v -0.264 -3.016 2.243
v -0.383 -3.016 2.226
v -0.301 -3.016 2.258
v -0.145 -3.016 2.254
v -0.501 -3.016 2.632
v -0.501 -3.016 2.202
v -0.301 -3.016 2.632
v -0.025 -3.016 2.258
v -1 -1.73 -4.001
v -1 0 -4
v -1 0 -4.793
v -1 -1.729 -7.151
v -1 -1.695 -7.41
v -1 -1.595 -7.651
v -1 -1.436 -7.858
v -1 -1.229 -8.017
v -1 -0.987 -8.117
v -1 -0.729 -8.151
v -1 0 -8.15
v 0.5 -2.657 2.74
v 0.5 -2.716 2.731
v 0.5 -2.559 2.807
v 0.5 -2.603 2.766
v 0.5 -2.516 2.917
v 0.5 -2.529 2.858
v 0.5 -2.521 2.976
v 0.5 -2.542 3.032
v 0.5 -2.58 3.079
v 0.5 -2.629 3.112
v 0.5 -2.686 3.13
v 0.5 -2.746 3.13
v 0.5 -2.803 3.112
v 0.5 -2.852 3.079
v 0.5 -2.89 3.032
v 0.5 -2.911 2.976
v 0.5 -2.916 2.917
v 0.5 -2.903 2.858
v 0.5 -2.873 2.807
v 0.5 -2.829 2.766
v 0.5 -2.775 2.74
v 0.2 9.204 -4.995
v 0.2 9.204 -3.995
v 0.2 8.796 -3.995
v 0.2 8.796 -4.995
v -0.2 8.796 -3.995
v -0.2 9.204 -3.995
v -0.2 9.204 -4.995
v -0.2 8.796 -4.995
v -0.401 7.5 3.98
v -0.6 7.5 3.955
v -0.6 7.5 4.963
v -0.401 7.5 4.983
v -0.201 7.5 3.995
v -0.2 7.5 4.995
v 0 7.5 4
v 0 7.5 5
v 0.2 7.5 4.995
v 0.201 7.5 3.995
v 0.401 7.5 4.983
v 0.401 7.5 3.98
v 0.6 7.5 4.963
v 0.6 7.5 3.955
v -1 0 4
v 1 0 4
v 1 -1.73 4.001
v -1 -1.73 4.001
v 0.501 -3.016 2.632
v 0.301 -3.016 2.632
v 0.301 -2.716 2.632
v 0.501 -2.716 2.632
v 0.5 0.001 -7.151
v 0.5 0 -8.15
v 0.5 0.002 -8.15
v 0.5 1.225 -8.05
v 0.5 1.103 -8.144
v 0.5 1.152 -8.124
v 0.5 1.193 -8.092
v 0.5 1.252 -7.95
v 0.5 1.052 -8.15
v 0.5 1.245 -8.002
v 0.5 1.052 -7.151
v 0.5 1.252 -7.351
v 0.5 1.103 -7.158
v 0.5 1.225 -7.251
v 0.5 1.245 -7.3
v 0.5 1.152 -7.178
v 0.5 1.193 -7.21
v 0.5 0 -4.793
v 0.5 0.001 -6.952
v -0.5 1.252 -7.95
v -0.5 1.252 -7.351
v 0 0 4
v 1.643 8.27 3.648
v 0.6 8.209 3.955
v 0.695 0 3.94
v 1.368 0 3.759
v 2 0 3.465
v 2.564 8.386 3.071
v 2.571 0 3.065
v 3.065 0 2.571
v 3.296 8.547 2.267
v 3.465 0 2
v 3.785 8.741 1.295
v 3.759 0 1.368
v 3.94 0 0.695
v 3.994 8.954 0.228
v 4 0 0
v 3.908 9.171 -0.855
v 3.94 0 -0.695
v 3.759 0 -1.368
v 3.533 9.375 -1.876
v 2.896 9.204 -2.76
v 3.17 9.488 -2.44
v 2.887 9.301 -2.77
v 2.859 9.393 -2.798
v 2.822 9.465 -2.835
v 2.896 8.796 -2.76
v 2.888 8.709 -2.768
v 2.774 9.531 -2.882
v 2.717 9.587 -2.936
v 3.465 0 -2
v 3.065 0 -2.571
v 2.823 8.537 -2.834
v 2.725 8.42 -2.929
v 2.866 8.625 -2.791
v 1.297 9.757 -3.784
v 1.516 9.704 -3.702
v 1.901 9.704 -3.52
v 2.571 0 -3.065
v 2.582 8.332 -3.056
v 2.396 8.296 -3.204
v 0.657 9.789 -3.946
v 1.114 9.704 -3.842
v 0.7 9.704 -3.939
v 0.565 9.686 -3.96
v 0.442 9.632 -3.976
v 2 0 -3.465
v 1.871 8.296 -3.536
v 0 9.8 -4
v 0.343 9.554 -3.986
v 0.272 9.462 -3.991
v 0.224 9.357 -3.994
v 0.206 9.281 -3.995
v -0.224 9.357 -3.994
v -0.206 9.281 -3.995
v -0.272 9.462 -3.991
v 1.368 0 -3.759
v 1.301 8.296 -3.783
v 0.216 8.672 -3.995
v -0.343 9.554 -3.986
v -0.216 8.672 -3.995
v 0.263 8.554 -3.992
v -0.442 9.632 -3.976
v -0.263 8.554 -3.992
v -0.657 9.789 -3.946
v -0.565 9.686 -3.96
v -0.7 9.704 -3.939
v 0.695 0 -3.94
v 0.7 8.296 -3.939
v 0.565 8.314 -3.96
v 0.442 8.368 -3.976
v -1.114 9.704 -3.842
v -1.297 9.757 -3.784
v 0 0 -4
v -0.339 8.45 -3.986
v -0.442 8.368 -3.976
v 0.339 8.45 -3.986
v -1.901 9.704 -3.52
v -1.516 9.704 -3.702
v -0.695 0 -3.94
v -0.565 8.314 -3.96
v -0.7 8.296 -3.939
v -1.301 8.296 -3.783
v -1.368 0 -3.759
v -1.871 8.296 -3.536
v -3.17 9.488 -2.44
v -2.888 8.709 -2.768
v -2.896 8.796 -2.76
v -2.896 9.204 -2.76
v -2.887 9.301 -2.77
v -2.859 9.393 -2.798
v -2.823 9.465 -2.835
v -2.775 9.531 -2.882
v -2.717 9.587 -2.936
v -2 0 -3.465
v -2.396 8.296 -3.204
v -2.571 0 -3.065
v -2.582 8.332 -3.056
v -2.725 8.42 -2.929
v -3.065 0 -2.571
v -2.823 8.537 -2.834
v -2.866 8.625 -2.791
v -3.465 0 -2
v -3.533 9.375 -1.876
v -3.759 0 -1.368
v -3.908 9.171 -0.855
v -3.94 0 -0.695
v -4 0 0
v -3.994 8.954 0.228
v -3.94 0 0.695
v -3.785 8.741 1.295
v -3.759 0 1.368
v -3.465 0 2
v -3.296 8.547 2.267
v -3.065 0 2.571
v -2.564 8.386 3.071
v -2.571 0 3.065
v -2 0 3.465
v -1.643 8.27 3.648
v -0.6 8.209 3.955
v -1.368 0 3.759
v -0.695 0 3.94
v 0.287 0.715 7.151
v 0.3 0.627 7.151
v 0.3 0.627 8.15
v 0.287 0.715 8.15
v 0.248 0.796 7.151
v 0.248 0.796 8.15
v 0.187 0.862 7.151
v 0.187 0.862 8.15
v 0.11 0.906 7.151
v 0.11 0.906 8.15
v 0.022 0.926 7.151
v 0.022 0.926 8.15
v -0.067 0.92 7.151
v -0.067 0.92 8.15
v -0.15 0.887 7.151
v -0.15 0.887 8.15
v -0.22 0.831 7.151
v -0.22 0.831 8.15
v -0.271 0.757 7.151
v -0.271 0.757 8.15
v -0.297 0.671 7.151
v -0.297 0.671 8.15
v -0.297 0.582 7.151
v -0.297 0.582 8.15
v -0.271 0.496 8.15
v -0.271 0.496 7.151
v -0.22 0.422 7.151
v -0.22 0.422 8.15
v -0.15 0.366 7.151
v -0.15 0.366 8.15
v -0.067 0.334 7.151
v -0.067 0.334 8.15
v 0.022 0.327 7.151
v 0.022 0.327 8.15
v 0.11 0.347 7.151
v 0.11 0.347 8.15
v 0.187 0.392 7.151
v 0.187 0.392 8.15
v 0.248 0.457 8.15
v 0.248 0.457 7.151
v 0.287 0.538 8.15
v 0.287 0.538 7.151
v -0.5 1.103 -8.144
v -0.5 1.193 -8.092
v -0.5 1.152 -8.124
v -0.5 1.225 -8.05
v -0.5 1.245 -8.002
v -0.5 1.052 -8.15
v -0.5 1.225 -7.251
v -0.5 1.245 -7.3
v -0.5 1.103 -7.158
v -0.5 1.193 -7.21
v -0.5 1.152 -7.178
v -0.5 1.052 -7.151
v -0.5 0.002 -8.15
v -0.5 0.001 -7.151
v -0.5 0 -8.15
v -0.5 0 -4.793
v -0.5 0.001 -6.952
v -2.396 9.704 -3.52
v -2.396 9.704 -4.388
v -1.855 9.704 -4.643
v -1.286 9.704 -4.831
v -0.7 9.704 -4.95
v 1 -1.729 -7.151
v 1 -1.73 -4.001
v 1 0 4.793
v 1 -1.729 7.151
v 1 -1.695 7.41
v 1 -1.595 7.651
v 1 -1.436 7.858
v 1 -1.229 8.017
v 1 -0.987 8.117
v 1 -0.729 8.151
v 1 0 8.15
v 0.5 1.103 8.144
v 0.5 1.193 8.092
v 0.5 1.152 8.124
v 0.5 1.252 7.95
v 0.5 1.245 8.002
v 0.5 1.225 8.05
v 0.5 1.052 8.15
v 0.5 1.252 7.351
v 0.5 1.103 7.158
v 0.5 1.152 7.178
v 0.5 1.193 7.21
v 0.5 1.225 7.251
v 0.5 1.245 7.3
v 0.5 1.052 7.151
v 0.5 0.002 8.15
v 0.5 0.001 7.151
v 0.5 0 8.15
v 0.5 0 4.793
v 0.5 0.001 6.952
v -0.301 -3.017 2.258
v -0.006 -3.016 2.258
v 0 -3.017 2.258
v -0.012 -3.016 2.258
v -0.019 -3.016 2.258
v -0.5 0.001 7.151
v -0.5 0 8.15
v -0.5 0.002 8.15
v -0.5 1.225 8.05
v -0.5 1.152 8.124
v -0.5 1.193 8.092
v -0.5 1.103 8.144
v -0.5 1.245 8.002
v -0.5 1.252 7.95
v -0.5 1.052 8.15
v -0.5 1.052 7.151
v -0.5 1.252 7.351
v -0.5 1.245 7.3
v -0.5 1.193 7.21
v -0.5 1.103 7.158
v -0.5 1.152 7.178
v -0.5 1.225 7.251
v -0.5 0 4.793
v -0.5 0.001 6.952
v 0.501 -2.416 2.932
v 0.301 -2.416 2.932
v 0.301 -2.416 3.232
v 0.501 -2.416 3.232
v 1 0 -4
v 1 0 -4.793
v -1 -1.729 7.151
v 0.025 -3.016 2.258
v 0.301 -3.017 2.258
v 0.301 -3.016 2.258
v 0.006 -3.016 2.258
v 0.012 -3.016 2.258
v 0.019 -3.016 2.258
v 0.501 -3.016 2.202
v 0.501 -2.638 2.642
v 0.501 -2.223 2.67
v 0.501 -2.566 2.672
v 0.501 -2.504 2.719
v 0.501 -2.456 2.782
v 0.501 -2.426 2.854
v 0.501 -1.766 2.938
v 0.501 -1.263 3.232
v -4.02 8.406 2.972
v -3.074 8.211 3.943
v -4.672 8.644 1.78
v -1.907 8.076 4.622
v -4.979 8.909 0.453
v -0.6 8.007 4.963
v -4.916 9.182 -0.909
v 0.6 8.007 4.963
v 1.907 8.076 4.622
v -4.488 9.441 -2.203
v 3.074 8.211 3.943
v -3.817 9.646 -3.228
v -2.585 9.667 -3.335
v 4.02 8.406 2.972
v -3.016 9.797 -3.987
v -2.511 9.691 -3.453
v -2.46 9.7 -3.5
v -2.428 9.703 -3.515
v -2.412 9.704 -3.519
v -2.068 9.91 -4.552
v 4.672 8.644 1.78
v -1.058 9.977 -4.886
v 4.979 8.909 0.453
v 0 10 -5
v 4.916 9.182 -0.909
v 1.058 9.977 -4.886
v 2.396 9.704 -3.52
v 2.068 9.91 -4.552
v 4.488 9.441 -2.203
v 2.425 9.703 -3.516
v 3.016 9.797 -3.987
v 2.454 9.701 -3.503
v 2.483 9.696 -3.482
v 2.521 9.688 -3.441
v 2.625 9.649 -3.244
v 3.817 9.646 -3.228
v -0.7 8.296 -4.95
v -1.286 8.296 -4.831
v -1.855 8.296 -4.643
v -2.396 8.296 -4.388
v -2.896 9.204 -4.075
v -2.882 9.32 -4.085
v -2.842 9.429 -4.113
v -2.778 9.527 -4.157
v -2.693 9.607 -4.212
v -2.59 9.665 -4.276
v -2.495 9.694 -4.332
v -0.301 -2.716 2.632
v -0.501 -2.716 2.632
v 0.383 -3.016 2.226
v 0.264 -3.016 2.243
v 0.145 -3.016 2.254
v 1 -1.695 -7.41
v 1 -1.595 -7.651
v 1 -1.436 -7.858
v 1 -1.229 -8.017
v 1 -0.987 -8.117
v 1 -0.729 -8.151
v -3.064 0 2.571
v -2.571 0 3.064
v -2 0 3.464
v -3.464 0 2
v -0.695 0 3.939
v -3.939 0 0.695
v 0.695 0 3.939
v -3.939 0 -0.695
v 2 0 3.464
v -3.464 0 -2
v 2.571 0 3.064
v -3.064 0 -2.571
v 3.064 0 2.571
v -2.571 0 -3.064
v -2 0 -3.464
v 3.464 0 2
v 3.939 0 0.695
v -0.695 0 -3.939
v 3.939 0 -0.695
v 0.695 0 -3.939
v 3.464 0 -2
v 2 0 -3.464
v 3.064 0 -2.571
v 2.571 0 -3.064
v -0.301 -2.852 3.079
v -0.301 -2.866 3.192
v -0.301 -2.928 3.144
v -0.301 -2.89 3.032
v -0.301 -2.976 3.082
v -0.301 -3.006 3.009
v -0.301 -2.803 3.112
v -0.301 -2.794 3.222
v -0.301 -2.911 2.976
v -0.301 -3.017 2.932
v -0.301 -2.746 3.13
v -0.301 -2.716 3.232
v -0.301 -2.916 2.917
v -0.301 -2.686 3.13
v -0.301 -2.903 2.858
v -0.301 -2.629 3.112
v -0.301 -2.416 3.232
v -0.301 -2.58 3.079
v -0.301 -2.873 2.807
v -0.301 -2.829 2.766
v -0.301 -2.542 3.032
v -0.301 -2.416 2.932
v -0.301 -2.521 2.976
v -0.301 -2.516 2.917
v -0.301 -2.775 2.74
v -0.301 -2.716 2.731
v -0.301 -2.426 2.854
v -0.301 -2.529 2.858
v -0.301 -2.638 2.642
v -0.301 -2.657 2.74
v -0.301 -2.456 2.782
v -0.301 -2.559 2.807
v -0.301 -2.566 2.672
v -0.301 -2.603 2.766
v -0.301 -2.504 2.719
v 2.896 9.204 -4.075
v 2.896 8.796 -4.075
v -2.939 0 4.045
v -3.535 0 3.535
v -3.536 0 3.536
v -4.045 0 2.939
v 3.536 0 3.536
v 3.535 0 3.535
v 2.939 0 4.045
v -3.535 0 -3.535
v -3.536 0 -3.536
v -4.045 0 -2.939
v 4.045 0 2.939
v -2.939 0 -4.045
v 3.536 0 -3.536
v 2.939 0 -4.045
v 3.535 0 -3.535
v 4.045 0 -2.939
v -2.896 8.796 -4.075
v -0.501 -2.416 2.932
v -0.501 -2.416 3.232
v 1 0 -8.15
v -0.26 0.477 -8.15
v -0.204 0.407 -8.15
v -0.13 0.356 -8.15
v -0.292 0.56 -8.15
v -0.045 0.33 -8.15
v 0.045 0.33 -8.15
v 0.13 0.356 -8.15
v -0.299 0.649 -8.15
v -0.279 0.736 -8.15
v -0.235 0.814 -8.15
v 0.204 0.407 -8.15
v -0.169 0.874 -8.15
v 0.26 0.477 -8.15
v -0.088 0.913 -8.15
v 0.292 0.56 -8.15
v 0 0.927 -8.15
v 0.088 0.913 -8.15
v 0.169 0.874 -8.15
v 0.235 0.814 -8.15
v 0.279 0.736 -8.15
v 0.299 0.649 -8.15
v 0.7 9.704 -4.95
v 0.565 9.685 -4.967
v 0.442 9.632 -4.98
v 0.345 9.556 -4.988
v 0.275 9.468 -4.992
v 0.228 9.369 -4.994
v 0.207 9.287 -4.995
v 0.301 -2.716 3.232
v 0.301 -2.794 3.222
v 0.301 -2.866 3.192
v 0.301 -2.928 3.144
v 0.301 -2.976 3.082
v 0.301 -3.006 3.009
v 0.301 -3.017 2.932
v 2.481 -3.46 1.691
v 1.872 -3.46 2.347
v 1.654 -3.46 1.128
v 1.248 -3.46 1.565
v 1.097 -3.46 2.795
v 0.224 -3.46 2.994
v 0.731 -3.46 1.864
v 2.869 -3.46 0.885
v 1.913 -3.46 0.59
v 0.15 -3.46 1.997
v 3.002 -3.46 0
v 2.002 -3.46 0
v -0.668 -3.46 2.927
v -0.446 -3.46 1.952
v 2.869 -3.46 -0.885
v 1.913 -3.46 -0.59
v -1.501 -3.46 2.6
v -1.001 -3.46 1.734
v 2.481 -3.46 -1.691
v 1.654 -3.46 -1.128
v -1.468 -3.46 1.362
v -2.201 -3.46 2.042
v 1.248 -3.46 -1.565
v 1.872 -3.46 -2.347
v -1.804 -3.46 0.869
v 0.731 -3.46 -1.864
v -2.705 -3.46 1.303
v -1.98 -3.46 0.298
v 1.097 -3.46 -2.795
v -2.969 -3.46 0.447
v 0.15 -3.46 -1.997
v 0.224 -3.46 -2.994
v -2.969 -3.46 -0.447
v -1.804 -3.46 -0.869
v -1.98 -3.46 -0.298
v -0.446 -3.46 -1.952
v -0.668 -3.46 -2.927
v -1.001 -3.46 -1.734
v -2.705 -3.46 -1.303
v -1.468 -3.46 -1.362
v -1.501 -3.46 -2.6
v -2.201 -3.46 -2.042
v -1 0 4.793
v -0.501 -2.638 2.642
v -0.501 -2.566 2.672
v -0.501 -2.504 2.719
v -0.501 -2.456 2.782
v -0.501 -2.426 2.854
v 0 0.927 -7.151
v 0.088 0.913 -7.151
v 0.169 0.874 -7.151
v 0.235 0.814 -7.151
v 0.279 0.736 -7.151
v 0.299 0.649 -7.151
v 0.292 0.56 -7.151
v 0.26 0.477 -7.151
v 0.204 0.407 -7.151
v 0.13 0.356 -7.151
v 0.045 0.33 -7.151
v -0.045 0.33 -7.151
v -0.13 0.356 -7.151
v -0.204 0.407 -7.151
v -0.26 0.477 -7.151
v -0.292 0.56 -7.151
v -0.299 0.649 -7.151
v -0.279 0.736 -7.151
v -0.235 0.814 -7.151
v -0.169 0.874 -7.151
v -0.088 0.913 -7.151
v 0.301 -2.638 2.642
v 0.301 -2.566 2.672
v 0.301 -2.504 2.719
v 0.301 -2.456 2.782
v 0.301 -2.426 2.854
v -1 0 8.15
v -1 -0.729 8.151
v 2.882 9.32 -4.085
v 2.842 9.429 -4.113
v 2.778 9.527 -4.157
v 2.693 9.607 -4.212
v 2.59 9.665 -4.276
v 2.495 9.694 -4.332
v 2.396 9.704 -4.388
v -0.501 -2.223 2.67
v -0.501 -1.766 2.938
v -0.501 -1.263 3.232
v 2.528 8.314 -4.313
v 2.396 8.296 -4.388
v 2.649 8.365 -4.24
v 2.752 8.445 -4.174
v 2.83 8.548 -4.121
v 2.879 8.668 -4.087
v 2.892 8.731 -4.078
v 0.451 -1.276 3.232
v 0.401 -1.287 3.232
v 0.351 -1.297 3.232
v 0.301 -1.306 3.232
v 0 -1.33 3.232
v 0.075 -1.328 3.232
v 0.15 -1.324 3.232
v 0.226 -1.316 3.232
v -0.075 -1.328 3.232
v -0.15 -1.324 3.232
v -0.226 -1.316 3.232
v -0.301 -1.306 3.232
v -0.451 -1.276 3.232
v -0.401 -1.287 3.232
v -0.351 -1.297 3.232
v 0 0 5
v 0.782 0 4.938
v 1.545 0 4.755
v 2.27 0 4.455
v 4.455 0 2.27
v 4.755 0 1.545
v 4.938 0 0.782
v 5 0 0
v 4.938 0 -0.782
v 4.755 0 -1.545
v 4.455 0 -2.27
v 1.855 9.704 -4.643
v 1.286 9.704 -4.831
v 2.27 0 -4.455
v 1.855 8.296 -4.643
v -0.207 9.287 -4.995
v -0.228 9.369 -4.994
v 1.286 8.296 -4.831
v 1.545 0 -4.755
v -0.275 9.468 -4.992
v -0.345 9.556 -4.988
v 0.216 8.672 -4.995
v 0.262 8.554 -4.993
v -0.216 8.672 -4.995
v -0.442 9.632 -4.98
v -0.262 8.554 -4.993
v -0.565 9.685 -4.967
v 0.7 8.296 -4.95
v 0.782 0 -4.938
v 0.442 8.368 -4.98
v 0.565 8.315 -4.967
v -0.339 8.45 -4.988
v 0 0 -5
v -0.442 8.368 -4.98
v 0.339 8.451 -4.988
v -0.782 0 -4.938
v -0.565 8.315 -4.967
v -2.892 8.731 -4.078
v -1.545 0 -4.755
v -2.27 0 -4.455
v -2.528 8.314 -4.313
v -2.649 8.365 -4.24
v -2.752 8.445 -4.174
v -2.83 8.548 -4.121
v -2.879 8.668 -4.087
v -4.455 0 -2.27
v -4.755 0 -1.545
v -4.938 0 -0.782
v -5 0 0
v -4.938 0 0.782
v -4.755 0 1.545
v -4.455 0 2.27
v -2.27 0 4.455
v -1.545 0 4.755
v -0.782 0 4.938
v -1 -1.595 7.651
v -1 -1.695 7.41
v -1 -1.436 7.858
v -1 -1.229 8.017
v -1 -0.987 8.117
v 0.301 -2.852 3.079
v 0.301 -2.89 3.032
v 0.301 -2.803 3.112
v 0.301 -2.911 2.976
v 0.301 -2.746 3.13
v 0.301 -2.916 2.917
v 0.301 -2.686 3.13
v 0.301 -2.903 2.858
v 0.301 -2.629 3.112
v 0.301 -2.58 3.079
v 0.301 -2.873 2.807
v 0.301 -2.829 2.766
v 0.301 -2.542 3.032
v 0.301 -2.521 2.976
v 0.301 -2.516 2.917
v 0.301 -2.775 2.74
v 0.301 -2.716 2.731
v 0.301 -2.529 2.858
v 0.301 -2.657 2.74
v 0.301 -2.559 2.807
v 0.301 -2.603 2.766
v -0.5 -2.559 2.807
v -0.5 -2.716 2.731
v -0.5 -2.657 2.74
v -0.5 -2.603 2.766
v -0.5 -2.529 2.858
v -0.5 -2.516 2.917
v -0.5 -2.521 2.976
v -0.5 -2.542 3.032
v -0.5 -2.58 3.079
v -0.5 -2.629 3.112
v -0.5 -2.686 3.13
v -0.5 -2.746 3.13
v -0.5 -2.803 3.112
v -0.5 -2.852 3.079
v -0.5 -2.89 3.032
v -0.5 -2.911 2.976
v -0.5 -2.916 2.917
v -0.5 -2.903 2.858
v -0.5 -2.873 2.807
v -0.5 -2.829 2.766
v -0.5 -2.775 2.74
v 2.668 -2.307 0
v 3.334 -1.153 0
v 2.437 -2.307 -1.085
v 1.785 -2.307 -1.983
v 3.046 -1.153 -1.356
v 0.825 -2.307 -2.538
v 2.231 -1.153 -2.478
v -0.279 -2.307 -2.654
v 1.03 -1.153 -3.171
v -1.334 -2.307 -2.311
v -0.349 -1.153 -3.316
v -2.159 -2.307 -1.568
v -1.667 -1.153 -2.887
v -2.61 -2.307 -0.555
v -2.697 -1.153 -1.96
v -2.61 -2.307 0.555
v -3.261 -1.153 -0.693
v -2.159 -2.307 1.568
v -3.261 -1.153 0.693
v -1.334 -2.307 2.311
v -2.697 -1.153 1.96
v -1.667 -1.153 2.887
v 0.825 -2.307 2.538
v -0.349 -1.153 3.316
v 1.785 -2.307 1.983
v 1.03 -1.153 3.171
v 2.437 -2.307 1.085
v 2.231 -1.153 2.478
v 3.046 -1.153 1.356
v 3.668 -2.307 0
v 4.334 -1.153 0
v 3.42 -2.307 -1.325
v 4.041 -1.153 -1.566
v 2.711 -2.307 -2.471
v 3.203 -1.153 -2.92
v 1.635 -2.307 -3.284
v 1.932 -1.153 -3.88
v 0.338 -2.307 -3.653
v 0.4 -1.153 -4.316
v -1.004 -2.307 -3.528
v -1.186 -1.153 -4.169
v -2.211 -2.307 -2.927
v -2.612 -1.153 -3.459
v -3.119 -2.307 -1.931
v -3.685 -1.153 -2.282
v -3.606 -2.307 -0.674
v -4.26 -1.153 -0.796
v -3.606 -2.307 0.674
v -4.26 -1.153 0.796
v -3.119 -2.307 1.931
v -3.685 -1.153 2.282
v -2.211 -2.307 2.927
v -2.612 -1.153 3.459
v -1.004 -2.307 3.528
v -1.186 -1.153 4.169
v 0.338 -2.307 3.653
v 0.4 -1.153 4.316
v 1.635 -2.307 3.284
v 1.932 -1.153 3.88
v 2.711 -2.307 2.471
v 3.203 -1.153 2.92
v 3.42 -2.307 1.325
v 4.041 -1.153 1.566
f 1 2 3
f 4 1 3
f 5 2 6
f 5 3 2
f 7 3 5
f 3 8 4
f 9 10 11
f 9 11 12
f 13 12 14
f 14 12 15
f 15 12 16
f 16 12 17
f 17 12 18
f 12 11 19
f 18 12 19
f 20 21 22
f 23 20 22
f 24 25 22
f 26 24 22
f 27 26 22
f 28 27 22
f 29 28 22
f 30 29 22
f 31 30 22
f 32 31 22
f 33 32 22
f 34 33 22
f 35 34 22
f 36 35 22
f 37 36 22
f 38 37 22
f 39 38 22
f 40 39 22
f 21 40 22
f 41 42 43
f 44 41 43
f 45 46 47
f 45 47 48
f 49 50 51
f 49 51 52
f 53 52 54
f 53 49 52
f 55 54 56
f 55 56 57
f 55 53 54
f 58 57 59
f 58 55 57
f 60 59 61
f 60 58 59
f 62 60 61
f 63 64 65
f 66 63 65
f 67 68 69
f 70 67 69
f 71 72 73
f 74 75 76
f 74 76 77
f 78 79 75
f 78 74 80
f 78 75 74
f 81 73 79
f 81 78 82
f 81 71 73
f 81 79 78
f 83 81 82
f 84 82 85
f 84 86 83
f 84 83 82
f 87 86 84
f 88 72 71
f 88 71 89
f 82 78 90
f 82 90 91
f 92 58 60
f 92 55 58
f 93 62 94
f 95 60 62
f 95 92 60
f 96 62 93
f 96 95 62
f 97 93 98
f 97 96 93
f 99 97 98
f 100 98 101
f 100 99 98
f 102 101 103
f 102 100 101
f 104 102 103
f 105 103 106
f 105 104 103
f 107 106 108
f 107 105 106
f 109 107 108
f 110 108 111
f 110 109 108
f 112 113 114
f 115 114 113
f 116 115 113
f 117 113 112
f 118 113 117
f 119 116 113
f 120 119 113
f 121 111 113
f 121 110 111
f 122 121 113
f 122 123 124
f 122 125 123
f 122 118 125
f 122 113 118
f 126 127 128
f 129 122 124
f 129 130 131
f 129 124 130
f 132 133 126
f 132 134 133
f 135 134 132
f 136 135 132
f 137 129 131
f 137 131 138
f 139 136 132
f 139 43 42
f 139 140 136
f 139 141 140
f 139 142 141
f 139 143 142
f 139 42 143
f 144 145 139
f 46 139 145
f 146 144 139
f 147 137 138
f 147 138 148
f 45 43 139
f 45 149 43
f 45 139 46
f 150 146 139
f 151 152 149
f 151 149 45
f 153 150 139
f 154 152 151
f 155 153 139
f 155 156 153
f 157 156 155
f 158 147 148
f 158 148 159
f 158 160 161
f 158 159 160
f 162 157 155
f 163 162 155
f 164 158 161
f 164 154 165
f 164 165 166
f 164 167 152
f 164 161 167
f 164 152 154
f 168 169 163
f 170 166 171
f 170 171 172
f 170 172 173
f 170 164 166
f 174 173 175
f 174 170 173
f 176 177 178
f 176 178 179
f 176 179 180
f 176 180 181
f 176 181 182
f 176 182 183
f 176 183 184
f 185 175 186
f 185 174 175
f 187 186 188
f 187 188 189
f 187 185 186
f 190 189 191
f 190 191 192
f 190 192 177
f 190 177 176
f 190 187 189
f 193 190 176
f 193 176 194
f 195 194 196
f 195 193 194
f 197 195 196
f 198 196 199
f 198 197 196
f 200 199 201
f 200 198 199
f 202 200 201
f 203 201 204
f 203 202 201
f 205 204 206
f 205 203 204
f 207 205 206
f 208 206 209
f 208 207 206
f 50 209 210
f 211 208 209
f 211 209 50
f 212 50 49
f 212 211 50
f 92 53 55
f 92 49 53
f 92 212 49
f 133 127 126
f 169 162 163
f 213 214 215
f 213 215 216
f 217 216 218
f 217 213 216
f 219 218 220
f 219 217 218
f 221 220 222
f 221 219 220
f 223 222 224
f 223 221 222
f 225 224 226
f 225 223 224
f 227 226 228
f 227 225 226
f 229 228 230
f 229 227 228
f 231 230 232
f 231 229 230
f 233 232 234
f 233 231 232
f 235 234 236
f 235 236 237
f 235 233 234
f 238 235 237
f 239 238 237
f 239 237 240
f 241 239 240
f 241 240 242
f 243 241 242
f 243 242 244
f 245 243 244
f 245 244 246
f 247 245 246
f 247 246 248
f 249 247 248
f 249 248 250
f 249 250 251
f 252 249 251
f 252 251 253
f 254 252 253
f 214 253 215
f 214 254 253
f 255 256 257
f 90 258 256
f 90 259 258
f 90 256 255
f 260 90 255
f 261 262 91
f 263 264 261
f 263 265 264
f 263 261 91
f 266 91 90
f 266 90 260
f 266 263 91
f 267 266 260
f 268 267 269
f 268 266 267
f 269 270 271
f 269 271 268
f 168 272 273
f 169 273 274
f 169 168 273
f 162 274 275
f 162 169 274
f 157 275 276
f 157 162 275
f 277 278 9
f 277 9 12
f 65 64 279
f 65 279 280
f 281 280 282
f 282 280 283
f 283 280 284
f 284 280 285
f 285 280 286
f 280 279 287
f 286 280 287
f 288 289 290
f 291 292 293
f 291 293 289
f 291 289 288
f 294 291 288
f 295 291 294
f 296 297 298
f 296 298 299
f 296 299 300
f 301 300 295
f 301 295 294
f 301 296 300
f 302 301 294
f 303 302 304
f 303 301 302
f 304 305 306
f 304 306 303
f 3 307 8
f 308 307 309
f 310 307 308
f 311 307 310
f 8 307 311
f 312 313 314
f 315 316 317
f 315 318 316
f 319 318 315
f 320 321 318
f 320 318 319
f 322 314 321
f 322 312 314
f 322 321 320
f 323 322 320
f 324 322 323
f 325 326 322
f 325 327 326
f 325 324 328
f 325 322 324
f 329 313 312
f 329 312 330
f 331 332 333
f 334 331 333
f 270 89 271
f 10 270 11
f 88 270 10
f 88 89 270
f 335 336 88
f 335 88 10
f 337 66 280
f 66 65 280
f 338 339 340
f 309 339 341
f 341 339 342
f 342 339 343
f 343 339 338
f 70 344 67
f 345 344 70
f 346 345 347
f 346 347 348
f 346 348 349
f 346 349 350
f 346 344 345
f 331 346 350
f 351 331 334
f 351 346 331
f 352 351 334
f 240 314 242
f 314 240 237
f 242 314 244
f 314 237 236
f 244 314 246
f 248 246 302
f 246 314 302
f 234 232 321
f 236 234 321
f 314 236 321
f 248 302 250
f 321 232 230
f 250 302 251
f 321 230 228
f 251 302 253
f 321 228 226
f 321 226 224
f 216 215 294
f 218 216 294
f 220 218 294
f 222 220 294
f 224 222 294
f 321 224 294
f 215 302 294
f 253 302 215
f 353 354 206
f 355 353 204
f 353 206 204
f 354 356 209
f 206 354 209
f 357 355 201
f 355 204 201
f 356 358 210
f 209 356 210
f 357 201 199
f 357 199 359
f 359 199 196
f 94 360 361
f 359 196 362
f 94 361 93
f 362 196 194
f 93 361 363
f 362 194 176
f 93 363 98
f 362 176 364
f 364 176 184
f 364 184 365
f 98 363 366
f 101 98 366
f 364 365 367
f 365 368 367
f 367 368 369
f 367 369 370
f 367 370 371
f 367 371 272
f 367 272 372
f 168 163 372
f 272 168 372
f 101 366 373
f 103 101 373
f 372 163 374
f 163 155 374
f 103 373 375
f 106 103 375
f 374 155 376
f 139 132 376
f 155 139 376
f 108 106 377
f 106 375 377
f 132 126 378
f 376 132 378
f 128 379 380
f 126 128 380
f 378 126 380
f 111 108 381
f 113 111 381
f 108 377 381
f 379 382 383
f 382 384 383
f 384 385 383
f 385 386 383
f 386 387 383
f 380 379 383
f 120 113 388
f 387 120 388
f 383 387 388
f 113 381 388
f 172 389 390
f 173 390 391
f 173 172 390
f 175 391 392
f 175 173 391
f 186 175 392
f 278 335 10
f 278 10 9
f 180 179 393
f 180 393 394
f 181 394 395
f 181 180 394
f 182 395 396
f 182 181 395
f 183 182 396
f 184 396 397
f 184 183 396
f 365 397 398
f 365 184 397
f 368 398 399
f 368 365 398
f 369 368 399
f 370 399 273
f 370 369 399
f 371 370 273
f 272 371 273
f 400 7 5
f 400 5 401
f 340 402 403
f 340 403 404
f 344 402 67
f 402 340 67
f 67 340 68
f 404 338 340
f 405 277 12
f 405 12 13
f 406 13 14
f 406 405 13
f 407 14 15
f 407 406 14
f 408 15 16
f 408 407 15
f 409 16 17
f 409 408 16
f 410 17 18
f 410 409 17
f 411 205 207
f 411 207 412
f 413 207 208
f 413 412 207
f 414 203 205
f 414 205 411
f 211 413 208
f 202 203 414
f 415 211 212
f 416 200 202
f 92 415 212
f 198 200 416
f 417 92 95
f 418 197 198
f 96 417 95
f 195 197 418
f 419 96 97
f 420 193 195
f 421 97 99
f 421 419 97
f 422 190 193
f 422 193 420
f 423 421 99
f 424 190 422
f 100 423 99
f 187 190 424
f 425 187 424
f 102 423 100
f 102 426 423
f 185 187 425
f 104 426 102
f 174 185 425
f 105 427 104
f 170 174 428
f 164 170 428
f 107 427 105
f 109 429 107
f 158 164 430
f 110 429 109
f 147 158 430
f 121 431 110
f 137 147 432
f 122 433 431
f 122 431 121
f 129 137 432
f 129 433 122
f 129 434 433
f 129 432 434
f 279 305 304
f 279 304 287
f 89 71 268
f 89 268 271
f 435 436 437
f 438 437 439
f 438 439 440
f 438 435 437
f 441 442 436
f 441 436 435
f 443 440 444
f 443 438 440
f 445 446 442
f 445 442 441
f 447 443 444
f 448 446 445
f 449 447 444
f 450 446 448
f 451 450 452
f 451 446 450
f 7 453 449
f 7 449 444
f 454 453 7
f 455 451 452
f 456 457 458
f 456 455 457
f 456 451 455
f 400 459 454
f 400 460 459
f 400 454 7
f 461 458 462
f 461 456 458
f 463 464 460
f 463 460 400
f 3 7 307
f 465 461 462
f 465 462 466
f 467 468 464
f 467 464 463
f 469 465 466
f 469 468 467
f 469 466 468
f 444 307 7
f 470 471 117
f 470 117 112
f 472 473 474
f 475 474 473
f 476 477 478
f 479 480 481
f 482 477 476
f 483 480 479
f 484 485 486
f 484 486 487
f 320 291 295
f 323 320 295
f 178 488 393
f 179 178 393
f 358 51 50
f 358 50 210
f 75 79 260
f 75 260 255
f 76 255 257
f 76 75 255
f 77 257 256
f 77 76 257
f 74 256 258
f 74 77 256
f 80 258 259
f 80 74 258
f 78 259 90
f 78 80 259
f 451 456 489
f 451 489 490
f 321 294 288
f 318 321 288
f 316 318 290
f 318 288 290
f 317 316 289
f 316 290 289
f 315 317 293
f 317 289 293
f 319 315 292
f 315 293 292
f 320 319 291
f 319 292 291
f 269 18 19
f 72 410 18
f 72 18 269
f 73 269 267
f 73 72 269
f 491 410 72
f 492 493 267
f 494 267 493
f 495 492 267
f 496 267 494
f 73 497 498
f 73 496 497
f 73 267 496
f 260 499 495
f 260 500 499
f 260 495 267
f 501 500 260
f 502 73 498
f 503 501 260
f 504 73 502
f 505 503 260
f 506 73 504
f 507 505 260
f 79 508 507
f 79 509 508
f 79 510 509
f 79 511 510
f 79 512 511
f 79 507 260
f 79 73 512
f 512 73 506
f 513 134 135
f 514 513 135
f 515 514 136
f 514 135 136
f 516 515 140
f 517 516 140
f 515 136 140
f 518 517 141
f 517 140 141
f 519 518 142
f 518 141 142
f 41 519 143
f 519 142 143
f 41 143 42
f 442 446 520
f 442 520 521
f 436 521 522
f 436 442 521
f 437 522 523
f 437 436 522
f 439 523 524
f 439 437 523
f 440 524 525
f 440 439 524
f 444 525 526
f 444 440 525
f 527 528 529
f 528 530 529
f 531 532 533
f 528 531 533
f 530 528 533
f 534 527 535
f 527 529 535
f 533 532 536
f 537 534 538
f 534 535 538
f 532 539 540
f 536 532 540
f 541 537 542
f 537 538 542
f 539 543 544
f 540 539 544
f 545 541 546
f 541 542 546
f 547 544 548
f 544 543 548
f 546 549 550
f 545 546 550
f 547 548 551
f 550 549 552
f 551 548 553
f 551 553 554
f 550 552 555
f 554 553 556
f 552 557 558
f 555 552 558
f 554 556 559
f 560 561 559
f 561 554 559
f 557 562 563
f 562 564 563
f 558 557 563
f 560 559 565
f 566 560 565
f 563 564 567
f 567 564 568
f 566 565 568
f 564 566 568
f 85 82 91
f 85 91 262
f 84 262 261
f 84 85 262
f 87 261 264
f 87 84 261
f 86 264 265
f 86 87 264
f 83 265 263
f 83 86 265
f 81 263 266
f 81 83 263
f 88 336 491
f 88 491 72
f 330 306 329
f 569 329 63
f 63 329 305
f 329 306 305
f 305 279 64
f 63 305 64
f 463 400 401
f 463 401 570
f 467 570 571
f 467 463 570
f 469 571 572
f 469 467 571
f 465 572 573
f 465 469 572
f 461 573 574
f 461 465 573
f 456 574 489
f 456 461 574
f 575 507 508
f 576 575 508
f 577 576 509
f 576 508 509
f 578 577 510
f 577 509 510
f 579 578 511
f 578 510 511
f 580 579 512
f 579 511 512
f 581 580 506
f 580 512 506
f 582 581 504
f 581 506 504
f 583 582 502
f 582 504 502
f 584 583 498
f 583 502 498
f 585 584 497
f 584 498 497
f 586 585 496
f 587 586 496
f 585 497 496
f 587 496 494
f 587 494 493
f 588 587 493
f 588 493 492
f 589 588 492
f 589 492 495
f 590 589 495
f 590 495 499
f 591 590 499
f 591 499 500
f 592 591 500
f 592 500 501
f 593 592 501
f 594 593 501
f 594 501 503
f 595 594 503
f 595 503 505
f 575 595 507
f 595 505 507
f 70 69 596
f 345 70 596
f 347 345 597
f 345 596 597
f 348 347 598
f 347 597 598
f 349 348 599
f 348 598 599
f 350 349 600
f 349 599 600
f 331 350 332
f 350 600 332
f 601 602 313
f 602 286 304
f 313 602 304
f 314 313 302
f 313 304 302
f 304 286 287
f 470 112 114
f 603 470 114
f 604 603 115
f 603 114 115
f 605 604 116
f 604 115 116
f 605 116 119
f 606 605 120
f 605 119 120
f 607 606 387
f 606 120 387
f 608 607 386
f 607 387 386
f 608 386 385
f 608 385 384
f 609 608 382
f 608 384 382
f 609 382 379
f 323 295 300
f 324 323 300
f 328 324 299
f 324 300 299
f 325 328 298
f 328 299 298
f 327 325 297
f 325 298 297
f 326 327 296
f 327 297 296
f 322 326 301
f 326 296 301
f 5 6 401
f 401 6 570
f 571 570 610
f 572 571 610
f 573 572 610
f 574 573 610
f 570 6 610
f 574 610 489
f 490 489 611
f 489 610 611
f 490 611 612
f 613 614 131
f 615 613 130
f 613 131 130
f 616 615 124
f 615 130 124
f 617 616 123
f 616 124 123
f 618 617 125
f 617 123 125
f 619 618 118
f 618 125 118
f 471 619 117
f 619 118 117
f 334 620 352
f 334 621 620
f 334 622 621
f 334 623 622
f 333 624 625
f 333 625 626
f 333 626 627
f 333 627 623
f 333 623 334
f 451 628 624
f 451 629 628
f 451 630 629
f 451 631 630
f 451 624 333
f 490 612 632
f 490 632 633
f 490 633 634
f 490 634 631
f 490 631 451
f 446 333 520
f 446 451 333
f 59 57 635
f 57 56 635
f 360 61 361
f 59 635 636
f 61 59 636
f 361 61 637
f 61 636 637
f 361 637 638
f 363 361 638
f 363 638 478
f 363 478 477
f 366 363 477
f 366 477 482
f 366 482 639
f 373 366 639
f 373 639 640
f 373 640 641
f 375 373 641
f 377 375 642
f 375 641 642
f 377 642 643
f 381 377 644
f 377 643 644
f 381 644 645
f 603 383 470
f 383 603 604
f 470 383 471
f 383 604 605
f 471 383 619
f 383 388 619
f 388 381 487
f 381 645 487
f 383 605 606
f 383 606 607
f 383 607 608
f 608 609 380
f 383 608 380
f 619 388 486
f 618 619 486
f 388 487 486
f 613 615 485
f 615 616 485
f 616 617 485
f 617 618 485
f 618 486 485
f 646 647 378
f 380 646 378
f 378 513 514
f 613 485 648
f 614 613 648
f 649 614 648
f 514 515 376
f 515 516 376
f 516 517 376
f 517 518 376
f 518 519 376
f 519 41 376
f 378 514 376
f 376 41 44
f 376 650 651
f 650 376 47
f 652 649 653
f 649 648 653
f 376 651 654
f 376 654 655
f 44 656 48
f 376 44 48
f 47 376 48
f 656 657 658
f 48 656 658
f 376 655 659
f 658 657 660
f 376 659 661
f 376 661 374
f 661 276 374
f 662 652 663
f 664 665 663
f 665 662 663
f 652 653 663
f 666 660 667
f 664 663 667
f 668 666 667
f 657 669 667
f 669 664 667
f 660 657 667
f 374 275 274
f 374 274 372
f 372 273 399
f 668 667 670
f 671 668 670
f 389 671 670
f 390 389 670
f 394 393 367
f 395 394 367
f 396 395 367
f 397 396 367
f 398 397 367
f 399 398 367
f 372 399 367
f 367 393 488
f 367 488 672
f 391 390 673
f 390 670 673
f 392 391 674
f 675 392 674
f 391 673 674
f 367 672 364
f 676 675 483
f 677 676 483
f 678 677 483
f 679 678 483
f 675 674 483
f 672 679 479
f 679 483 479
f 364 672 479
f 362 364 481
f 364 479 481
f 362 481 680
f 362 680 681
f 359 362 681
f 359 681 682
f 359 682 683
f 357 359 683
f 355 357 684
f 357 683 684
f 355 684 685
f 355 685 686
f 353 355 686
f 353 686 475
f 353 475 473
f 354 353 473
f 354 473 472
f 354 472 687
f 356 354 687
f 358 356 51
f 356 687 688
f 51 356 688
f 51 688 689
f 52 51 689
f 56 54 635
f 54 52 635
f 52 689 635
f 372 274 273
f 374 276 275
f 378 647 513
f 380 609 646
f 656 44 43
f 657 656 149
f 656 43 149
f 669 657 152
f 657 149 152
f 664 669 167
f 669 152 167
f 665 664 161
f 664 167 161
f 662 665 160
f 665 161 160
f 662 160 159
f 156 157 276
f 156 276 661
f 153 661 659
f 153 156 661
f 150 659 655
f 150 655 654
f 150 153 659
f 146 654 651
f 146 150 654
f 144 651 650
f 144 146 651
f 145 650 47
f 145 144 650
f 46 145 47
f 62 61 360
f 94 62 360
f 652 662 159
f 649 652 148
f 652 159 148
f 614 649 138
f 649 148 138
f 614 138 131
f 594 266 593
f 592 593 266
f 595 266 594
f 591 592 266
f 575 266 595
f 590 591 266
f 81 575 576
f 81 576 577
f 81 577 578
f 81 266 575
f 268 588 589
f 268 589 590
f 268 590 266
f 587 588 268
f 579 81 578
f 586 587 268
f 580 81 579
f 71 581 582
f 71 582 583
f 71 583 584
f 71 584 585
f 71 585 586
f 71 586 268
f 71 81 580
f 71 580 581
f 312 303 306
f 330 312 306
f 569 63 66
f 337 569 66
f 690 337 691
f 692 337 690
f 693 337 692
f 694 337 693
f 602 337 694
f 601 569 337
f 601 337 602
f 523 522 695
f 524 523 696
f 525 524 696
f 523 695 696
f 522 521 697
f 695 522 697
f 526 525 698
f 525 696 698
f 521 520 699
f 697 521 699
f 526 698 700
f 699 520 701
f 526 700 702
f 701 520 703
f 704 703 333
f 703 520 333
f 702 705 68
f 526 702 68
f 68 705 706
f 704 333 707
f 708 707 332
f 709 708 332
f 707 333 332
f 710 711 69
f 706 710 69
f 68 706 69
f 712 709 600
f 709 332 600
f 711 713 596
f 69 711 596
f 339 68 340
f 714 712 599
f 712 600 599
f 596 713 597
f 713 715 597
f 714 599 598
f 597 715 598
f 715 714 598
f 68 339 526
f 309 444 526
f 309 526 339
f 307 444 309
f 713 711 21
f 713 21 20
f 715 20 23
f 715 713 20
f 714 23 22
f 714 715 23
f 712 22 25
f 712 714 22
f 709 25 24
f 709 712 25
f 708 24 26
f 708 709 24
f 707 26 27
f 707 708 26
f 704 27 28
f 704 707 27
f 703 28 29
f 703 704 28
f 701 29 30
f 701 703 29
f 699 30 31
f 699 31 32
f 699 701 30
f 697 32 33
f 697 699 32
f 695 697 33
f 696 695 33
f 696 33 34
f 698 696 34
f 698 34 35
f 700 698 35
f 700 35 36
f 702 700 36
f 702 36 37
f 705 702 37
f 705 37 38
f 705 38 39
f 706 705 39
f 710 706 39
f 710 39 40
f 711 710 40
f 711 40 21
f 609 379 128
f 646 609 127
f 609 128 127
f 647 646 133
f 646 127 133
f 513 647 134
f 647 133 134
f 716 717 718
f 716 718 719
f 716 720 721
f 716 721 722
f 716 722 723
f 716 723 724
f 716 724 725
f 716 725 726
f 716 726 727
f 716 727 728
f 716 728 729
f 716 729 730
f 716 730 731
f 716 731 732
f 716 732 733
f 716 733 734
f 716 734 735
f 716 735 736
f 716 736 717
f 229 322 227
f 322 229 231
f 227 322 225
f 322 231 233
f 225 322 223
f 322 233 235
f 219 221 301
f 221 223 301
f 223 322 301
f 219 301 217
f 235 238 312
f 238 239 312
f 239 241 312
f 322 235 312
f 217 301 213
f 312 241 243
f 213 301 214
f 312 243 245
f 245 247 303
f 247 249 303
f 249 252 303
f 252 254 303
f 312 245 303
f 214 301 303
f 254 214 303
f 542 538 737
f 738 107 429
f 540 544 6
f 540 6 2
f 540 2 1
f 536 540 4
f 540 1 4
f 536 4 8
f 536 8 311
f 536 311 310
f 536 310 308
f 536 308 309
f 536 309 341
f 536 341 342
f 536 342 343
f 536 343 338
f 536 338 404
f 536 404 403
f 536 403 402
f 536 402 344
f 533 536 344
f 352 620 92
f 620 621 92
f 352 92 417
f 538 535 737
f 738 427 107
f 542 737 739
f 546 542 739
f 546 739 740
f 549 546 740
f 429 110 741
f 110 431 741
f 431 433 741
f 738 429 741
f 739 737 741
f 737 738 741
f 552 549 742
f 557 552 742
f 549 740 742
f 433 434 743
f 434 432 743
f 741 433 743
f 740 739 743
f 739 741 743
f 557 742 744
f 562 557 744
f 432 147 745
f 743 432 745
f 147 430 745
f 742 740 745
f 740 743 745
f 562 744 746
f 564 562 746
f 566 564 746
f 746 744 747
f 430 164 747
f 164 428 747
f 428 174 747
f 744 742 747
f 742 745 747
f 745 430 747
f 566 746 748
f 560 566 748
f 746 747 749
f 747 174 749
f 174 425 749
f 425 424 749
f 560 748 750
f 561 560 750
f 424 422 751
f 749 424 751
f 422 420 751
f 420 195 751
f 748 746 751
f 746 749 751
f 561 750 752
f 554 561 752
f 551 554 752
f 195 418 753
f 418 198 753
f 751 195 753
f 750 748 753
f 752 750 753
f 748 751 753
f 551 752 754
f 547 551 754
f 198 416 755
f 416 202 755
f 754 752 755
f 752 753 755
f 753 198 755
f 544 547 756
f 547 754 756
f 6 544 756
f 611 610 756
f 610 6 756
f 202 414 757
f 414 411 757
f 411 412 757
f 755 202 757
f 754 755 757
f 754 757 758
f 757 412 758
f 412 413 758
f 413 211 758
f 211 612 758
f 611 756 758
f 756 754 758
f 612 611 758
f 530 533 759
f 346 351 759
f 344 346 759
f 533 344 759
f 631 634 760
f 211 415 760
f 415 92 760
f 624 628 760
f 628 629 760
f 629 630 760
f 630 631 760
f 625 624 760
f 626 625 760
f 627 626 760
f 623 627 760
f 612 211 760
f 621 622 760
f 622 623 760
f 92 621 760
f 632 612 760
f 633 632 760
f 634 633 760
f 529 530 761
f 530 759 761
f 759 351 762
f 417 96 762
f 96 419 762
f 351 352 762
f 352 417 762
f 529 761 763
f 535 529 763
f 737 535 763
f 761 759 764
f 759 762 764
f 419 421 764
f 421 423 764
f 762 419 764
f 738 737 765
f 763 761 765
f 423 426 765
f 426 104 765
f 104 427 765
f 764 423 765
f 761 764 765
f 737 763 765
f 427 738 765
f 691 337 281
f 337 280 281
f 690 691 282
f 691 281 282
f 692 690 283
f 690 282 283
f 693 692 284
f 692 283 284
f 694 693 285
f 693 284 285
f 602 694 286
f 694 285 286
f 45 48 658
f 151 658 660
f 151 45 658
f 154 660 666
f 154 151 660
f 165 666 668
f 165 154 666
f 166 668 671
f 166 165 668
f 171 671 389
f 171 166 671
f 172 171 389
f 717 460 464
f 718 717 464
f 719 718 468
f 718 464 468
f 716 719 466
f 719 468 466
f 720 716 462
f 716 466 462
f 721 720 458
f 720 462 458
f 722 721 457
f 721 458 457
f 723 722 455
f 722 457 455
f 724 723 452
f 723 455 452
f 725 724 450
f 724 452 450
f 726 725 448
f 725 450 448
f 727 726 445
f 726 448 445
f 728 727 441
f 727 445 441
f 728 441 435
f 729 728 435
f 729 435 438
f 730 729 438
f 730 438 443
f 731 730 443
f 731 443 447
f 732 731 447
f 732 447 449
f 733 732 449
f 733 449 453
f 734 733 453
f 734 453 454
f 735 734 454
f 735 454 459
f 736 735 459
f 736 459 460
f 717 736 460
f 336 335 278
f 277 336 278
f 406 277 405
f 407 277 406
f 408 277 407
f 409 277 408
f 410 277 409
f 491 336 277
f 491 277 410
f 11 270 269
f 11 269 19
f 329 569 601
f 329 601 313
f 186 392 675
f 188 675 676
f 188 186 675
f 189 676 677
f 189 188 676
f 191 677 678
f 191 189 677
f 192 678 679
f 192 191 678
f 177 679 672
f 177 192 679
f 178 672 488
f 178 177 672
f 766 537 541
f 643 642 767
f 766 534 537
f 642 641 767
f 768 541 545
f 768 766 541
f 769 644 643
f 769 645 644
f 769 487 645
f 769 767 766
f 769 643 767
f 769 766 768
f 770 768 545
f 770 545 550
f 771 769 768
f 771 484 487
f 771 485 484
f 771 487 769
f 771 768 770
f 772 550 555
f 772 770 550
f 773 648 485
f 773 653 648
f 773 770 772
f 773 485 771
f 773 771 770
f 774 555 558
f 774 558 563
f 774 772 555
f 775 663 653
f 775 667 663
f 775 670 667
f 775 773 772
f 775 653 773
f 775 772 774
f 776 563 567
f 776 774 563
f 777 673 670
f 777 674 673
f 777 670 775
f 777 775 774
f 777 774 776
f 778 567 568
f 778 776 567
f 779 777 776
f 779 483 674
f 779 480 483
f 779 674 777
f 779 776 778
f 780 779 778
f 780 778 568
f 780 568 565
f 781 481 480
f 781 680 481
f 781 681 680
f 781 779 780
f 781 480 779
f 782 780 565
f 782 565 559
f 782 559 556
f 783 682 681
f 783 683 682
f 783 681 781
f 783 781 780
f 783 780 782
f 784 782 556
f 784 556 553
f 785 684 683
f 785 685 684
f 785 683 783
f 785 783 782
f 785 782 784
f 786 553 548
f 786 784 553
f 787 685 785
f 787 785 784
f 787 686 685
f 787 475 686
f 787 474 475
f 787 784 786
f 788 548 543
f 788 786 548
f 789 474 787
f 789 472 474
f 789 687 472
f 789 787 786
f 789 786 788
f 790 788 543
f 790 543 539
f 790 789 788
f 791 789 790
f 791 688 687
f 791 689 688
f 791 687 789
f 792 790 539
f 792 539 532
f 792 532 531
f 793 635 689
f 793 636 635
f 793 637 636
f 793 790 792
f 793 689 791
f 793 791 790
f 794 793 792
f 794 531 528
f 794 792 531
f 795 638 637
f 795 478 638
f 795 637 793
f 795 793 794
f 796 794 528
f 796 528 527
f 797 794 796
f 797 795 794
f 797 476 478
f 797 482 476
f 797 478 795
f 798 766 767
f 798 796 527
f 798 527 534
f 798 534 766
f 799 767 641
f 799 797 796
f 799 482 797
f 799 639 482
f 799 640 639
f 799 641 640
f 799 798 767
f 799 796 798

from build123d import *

# Parameters (mm, degrees)
SKETCH1_R                  = 4.9995
SKETCH1_R_2                = 4.0005
BOSS_EXTRUDE1_DEPTH        = 10
SKETCH2_R                  = 5
BOSS_EXTRUDE2_DEPTH        = 5
BOSS_EXTRUDE2_DRAFT        = -30
SKETCH3_R                  = 4
CUT_EXTRUDE1_DEPTH         = 5
CUT_EXTRUDE1_DRAFT         = -30
CUT_EXTRUDE6_DEPTH         = 0.301
CUT_EXTRUDE6_DEPTH_BACK    = 0.301
SKETCH10_R                 = 0.2005
CUT_EXTRUDE9_DEPTH         = 0.5
CUT_EXTRUDE9_DEPTH_BACK    = 0.5
CUT_EXTRUDE10_DEPTH        = 6
CUT_EXTRUDE10_DEPTH_BACK   = 6
CUT_EXTRUDE13_DEPTH        = 6
SKETCH14_W                 = 9.766449239
SKETCH14_H                 = 2.017046323
CUT_EXTRUDE14_DEPTH        = 6
CUT_EXTRUDE14_DEPTH_BACK   = 6
BOSS_EXTRUDE3_DEPTH        = 1
BOSS_EXTRUDE3_DEPTH_BACK   = 1
BOSS_EXTRUDE3_2_DEPTH      = 1
BOSS_EXTRUDE3_2_DEPTH_BACK = 1
SKETCH18_W                 = 1.2
SKETCH18_H                 = 1.068876387
CUT_EXTRUDE15_DEPTH        = 9.150724798
CUT_EXTRUDE16_START        = -13.149942
SKETCH19_W                 = 0.5
SKETCH19_H                 = 1.05
CUT_EXTRUDE16_DEPTH        = 13.150225
CUT_EXTRUDE17_START        = -13.150442
SKETCH20_W                 = 0.5
SKETCH20_H                 = 1.05
CUT_EXTRUDE17_DEPTH        = 13.150725
SKETCH22_R                 = 0.3005
CUT_EXTRUDE19_DEPTH        = 0.999
SKETCH24_R                 = 0.3
CUT_EXTRUDE20_DEPTH        = 0.999
CUT_EXTRUDE21_DEPTH        = 0.501
CUT_EXTRUDE21_DEPTH_BACK   = 0.501


with BuildPart() as part:
    # Sketch1 → Boss-Extrude1 (new body)
    with BuildSketch(Plane(origin=(0, 0, 0), x_dir=(1, 0, 0), z_dir=(0, 1, 0))):
        with Locations(Location((0, 0, 0), (0, 0, 270))):  # turned: the seam where the file's is
            Circle(SKETCH1_R)
        with Locations(Location((0, 0, 0), (0, 0, 270))):  # turned: the seam where the file's is
            Circle(SKETCH1_R_2, mode=Mode.SUBTRACT)
    extrude(amount=BOSS_EXTRUDE1_DEPTH)


with BuildPart() as boss_extrude2_tool:
    # Sketch2 → Boss-Extrude2 (with draft: the straight prism first)
    with BuildSketch(Plane(origin=(0, 0, 0), x_dir=(1, 0, 0), z_dir=(0, 1, 0))):
        Circle(SKETCH2_R)
    extrude(amount=-BOSS_EXTRUDE2_DEPTH)
    # Boss-Extrude2: the draft: its side faces are tilted about the plane it starts from
    boss_extrude2_sides = [boss_extrude2_tool.faces().sort_by_distance(p)[0] for p in [
        (-5, -2.5, 0),
    ]]
    draft(boss_extrude2_sides, Plane(origin=(0, 0, 0), x_dir=(1, 0, 0), z_dir=(0, 1, 0)), BOSS_EXTRUDE2_DRAFT)


with BuildPart() as part_1:
    add(part.part)

    # Boss-Extrude2: add boss_extrude2_tool
    add(boss_extrude2_tool.part)


with BuildPart() as cut_extrude1_tool:
    # Sketch3 → Cut-Extrude1 (with draft: the straight prism first)
    with BuildSketch(Plane(origin=(0, 0, 0), x_dir=(1, 0, 0), z_dir=(0, 1, 0))):
        Circle(SKETCH3_R)
    extrude(amount=-CUT_EXTRUDE1_DEPTH)
    # Cut-Extrude1: the draft: its side faces are tilted about the plane it starts from
    cut_extrude1_sides = [cut_extrude1_tool.faces().sort_by_distance(p)[0] for p in [
        (-4, -2.5, 0),
    ]]
    draft(cut_extrude1_sides, Plane(origin=(0, 0, 0), x_dir=(1, 0, 0), z_dir=(0, 1, 0)), CUT_EXTRUDE1_DRAFT)


with BuildPart() as part_2:
    add(part_1.part)

    # Cut-Extrude1: cut by cut_extrude1_tool
    add(cut_extrude1_tool.part, mode=Mode.SUBTRACT)

    # Sketch9 → Cut-Extrude6 (cut, two sides)
    with BuildSketch(Plane(origin=(0, 0, 0), x_dir=(0, 0, -1), z_dir=(1, 0, 0))) as cut_extrude6_sk:
        with BuildLine():
            Line((-2.931624327, -3.016506351), (-2.258419246, -3.016506351))
            Line((-2.258419246, -3.016506351), (-2.305810355, -2.700813972))
            Line((-2.305810355, -2.700813972), (-2.605810355, -2.18119873))
            Line((-2.605810355, -2.18119873), (-3.232124327, -1.157671827))
            Line((-3.232124327, -1.157671827), (-3.232124327, -2.716006351))
            ThreePointArc((-3.232124327, -2.716006351), (-3.144109915, -2.928491939), (-2.931624327, -3.016506351))
        make_face()
    extrude(amount=CUT_EXTRUDE6_DEPTH, mode=Mode.SUBTRACT)
    extrude(cut_extrude6_sk.sketch, amount=-CUT_EXTRUDE6_DEPTH_BACK, mode=Mode.SUBTRACT)

    # Sketch10 → Cut-Extrude9 (cut, two sides)
    with BuildSketch(Plane(origin=(0, 0, 0), x_dir=(0, 0, -1), z_dir=(1, 0, 0))) as cut_extrude9_sk:
        with Locations((-2.931624327, -2.716006351)):
            Circle(SKETCH10_R)
    extrude(amount=CUT_EXTRUDE9_DEPTH, mode=Mode.SUBTRACT)
    extrude(cut_extrude9_sk.sketch, amount=-CUT_EXTRUDE9_DEPTH_BACK, mode=Mode.SUBTRACT)

    # Sketch11 → Cut-Extrude10 (cut, two sides)
    with BuildSketch(Plane(origin=(0, 0, 0), x_dir=(0, 0, -1), z_dir=(1, 0, 0))) as cut_extrude10_sk:
        Polygon((-6.255560267, 7.748887947), (6.541927726, 10.308385545), (-6.255560267, 10.308385545), align=None)
    extrude(amount=CUT_EXTRUDE10_DEPTH, mode=Mode.SUBTRACT)
    extrude(cut_extrude10_sk.sketch, amount=-CUT_EXTRUDE10_DEPTH_BACK, mode=Mode.SUBTRACT)

    # Sketch12 → Cut-Extrude13 (cut, through all)
    with BuildSketch(Plane.XY):
        with BuildLine():
            Line((2.896053459, 8.796016707), (2.896053459, 9.203983293))
            ThreePointArc((2.896053459, 9.203983293), (2.74960685, 9.557536684), (2.396053459, 9.703983293))
            Line((2.396053459, 9.703983293), (0.7, 9.703983293))
            ThreePointArc((0.7, 9.703983293), (0.346446609, 9.557536684), (0.2, 9.203983293))
            Line((0.2, 9.203983293), (0.2, 8.796016707))
            ThreePointArc((0.2, 8.796016707), (0.346446609, 8.442463316), (0.7, 8.296016707))
            Line((0.7, 8.296016707), (2.396053459, 8.296016707))
            ThreePointArc((2.396053459, 8.296016707), (2.74960685, 8.442463316), (2.896053459, 8.796016707))
        make_face()
        with BuildLine():
            Line((-2.896053459, 8.796016707), (-2.896053459, 9.203983293))
            ThreePointArc((-2.896053459, 9.203983293), (-2.74960685, 9.557536684), (-2.396053459, 9.703983293))
            Line((-2.396053459, 9.703983293), (-0.7, 9.703983293))
            ThreePointArc((-0.7, 9.703983293), (-0.346446609, 9.557536684), (-0.2, 9.203983293))
            Line((-0.2, 9.203983293), (-0.2, 8.796016707))
            ThreePointArc((-0.2, 8.796016707), (-0.346446609, 8.442463316), (-0.7, 8.296016707))
            Line((-0.7, 8.296016707), (-2.396053459, 8.296016707))
            ThreePointArc((-2.396053459, 8.296016707), (-2.74960685, 8.442463316), (-2.896053459, 8.796016707))
        make_face()
    extrude(amount=-CUT_EXTRUDE13_DEPTH, mode=Mode.SUBTRACT)

    # Sketch14 → Cut-Extrude14 (cut, two sides)
    with BuildSketch(Plane(origin=(0, 0, 0), x_dir=(0, 0, -1), z_dir=(1, 0, 0))) as cut_extrude14_sk:
        with Locations((-0.116775381, -4.468773181)):
            Rectangle(SKETCH14_W, SKETCH14_H)
    extrude(amount=CUT_EXTRUDE14_DEPTH, mode=Mode.SUBTRACT)
    extrude(cut_extrude14_sk.sketch, amount=-CUT_EXTRUDE14_DEPTH_BACK, mode=Mode.SUBTRACT)

    # Sketch18 → Cut-Extrude15 (cut, through all)
    with BuildSketch(Plane.XY):
        with Locations((0, 8.034538194)):
            Rectangle(SKETCH18_W, SKETCH18_H)
    extrude(amount=CUT_EXTRUDE15_DEPTH, mode=Mode.SUBTRACT)

    # Sketch26 → Cut-Extrude21 (cut, two sides)
    with BuildSketch(Plane(origin=(0, 0, 0), x_dir=(0, 0, -1), z_dir=(1, 0, 0))) as cut_extrude21_sk:
        with BuildLine():
            Line((-2.931624327, -2.416006351), (-3.232124327, -2.416006351))
            Line((-3.232124327, -2.416006351), (-3.232124327, -0.963843284))
            Line((-3.232124327, -0.963843284), (-1.865300653, -0.963843284))
            Line((-1.865300653, -0.963843284), (-1.865300653, -3.016006351))
            Line((-1.865300653, -3.016006351), (-2.631624327, -3.016365681))
            Line((-2.631624327, -3.016365681), (-2.631624327, -2.716006351))
            ThreePointArc((-2.631624327, -2.716006351), (-2.719492293, -2.503874317), (-2.931624327, -2.416006351))
        make_face()
    extrude(amount=CUT_EXTRUDE21_DEPTH, mode=Mode.SUBTRACT)
    extrude(cut_extrude21_sk.sketch, amount=-CUT_EXTRUDE21_DEPTH_BACK, mode=Mode.SUBTRACT)


with BuildPart() as body_2:
    # Sketch15 → Boss-Extrude3 (new body, two sides)
    with BuildSketch(Plane(origin=(0, 0, 0), x_dir=(0, 0, -1), z_dir=(1, 0, 0))) as boss_extrude3_sk:
        with BuildLine():
            Line((-4.000442184, -0.000306746), (-4.00111186, -1.73012501))
            Line((-4.00111186, -1.73012501), (-7.151111935, -1.728905528))
            ThreePointArc((-7.151111935, -1.728905528), (-7.858105273, -1.435738585), (-8.150724723, -0.728518467))
            Line((-8.150724723, -0.728518467), (-8.150442065, 0.001606846))
            Line((-8.150442065, 0.001606846), (-8.150442065, 1.051606846))
            ThreePointArc((-8.150442065, 1.051606846), (-8.091863421, 1.193028202), (-7.950442065, 1.251606846))
            Line((-7.950442065, 1.251606846), (-7.351442065, 1.251606846))
            ThreePointArc((-7.351442065, 1.251606846), (-7.210020708, 1.193028202), (-7.151442065, 1.051606846))
            Line((-7.151442065, 1.051606846), (-7.151442065, 0.20083571))
            Line((-7.151442065, 0.20083571), (-7.151442065, 0.000835725))
            Line((-7.151442065, 0.000835725), (-6.951519492, 0.000835725))
            Line((-6.951519492, 0.000835725), (-4.000442184, -0.000306746))
        make_face()
    extrude(amount=BOSS_EXTRUDE3_DEPTH)
    extrude(boss_extrude3_sk.sketch, amount=-BOSS_EXTRUDE3_DEPTH_BACK)

    # Sketch19 → Cut-Extrude16 (cut)
    with BuildSketch(Plane.XY.offset(8.150442065).offset(CUT_EXTRUDE16_START)):
        with Locations((-0.75, 0.526606846)):
            Rectangle(SKETCH19_W, SKETCH19_H)
        with Locations((0.75, 0.526606846)):
            Rectangle(SKETCH19_W, SKETCH19_H)
        Polygon((-1, 1.051606846), (-0.5, 1.051606846), (-0.5, 2.101606846), (-1.497228445, 2.101606846), (-1.497228445, 0), (-0.5, 0), (-0.5, 0.001606846), (-1, 0.001606846), align=None)
        Polygon((1.705190103, 2.101606846), (0.5, 2.101606846), (0.5, 1.051606846), (1, 1.051606846), (1, 0.001606846), (0.5, 0.001606846), (0.5, 0), (1.705190103, 0), align=None)
    extrude(amount=CUT_EXTRUDE16_DEPTH, mode=Mode.SUBTRACT)

    # Sketch22 → Cut-Extrude19 (cut)
    with BuildSketch(Plane.XY.offset(7.151442065)):
        with Locations((0, 0.626606618)):
            Circle(SKETCH22_R)
    extrude(amount=CUT_EXTRUDE19_DEPTH, mode=Mode.SUBTRACT)


with BuildPart() as body_3:
    # Sketch15 → Boss-Extrude3 2 (new body, two sides)
    with BuildSketch(Plane(origin=(0, 0, 0), x_dir=(0, 0, -1), z_dir=(1, 0, 0))) as boss_extrude3_2_sk:
        with BuildLine():
            Line((7.151442065, 1.051606846), (7.151442065, 0.20083571))
            Line((7.151442065, 0.20083571), (7.151442065, 0.000835725))
            Line((7.151442065, 0.000835725), (6.951519492, 0.000835725))
            Line((6.951519492, 0.000835725), (4.000442184, -0.000306746))
            Line((4.000442184, -0.000306746), (4.00111186, -1.73012501))
            Line((4.00111186, -1.73012501), (7.151111935, -1.728905528))
            ThreePointArc((7.151111935, -1.728905528), (7.858105273, -1.435738585), (8.150724723, -0.728518467))
            Line((8.150724723, -0.728518467), (8.150442065, 0.001606846))
            Line((8.150442065, 0.001606846), (8.150442065, 1.051606846))
            ThreePointArc((8.150442065, 1.051606846), (8.091863421, 1.193028202), (7.950442065, 1.251606846))
            Line((7.950442065, 1.251606846), (7.351442065, 1.251606846))
            ThreePointArc((7.351442065, 1.251606846), (7.210020708, 1.193028202), (7.151442065, 1.051606846))
        make_face()
    extrude(amount=BOSS_EXTRUDE3_2_DEPTH)
    extrude(boss_extrude3_2_sk.sketch, amount=-BOSS_EXTRUDE3_2_DEPTH_BACK)

    # Sketch20 → Cut-Extrude17 (cut)
    with BuildSketch(Plane(origin=(0, 0, -8.150442065), x_dir=(-1, 0, 0), z_dir=(0, 0, -1)).offset(CUT_EXTRUDE17_START)):
        with Locations((-0.75, 0.526606846)):
            Rectangle(SKETCH20_W, SKETCH20_H)
        with Locations((0.75, 0.526606846)):
            Rectangle(SKETCH20_W, SKETCH20_H)
        Polygon((0.5, 2.102586695), (0.5, 1.051606846), (1, 1.051606846), (1, 0.001606846), (0.5, 0.001606846), (0.5, 0.000626541), (0.5, 0), (1.393428378, 0), (1.393428378, 2.102586695), align=None)
        Polygon((-0.5, 1.051606846), (-0.5, 2.102586695), (-1.402882221, 2.102586695), (-1.402882221, 0), (-0.5, 0), (-0.5, 0.000626541), (-0.5, 0.001606846), (-1, 0.001606846), (-1, 1.051606846), align=None)
    extrude(amount=CUT_EXTRUDE17_DEPTH, mode=Mode.SUBTRACT)

    # Sketch24 → Cut-Extrude20 (cut)
    with BuildSketch(Plane(origin=(0, 0, -8.150442065), x_dir=(-1, 0, 0), z_dir=(0, 0, -1))):
        with Locations(Location((0, 0.626606618, 0), (0, 0, 90))):  # turned: the seam where the file's is
            Circle(SKETCH24_R)
    extrude(amount=-CUT_EXTRUDE20_DEPTH, mode=Mode.SUBTRACT)


solid = Compound([part_2.part, body_2.part, body_3.part])
